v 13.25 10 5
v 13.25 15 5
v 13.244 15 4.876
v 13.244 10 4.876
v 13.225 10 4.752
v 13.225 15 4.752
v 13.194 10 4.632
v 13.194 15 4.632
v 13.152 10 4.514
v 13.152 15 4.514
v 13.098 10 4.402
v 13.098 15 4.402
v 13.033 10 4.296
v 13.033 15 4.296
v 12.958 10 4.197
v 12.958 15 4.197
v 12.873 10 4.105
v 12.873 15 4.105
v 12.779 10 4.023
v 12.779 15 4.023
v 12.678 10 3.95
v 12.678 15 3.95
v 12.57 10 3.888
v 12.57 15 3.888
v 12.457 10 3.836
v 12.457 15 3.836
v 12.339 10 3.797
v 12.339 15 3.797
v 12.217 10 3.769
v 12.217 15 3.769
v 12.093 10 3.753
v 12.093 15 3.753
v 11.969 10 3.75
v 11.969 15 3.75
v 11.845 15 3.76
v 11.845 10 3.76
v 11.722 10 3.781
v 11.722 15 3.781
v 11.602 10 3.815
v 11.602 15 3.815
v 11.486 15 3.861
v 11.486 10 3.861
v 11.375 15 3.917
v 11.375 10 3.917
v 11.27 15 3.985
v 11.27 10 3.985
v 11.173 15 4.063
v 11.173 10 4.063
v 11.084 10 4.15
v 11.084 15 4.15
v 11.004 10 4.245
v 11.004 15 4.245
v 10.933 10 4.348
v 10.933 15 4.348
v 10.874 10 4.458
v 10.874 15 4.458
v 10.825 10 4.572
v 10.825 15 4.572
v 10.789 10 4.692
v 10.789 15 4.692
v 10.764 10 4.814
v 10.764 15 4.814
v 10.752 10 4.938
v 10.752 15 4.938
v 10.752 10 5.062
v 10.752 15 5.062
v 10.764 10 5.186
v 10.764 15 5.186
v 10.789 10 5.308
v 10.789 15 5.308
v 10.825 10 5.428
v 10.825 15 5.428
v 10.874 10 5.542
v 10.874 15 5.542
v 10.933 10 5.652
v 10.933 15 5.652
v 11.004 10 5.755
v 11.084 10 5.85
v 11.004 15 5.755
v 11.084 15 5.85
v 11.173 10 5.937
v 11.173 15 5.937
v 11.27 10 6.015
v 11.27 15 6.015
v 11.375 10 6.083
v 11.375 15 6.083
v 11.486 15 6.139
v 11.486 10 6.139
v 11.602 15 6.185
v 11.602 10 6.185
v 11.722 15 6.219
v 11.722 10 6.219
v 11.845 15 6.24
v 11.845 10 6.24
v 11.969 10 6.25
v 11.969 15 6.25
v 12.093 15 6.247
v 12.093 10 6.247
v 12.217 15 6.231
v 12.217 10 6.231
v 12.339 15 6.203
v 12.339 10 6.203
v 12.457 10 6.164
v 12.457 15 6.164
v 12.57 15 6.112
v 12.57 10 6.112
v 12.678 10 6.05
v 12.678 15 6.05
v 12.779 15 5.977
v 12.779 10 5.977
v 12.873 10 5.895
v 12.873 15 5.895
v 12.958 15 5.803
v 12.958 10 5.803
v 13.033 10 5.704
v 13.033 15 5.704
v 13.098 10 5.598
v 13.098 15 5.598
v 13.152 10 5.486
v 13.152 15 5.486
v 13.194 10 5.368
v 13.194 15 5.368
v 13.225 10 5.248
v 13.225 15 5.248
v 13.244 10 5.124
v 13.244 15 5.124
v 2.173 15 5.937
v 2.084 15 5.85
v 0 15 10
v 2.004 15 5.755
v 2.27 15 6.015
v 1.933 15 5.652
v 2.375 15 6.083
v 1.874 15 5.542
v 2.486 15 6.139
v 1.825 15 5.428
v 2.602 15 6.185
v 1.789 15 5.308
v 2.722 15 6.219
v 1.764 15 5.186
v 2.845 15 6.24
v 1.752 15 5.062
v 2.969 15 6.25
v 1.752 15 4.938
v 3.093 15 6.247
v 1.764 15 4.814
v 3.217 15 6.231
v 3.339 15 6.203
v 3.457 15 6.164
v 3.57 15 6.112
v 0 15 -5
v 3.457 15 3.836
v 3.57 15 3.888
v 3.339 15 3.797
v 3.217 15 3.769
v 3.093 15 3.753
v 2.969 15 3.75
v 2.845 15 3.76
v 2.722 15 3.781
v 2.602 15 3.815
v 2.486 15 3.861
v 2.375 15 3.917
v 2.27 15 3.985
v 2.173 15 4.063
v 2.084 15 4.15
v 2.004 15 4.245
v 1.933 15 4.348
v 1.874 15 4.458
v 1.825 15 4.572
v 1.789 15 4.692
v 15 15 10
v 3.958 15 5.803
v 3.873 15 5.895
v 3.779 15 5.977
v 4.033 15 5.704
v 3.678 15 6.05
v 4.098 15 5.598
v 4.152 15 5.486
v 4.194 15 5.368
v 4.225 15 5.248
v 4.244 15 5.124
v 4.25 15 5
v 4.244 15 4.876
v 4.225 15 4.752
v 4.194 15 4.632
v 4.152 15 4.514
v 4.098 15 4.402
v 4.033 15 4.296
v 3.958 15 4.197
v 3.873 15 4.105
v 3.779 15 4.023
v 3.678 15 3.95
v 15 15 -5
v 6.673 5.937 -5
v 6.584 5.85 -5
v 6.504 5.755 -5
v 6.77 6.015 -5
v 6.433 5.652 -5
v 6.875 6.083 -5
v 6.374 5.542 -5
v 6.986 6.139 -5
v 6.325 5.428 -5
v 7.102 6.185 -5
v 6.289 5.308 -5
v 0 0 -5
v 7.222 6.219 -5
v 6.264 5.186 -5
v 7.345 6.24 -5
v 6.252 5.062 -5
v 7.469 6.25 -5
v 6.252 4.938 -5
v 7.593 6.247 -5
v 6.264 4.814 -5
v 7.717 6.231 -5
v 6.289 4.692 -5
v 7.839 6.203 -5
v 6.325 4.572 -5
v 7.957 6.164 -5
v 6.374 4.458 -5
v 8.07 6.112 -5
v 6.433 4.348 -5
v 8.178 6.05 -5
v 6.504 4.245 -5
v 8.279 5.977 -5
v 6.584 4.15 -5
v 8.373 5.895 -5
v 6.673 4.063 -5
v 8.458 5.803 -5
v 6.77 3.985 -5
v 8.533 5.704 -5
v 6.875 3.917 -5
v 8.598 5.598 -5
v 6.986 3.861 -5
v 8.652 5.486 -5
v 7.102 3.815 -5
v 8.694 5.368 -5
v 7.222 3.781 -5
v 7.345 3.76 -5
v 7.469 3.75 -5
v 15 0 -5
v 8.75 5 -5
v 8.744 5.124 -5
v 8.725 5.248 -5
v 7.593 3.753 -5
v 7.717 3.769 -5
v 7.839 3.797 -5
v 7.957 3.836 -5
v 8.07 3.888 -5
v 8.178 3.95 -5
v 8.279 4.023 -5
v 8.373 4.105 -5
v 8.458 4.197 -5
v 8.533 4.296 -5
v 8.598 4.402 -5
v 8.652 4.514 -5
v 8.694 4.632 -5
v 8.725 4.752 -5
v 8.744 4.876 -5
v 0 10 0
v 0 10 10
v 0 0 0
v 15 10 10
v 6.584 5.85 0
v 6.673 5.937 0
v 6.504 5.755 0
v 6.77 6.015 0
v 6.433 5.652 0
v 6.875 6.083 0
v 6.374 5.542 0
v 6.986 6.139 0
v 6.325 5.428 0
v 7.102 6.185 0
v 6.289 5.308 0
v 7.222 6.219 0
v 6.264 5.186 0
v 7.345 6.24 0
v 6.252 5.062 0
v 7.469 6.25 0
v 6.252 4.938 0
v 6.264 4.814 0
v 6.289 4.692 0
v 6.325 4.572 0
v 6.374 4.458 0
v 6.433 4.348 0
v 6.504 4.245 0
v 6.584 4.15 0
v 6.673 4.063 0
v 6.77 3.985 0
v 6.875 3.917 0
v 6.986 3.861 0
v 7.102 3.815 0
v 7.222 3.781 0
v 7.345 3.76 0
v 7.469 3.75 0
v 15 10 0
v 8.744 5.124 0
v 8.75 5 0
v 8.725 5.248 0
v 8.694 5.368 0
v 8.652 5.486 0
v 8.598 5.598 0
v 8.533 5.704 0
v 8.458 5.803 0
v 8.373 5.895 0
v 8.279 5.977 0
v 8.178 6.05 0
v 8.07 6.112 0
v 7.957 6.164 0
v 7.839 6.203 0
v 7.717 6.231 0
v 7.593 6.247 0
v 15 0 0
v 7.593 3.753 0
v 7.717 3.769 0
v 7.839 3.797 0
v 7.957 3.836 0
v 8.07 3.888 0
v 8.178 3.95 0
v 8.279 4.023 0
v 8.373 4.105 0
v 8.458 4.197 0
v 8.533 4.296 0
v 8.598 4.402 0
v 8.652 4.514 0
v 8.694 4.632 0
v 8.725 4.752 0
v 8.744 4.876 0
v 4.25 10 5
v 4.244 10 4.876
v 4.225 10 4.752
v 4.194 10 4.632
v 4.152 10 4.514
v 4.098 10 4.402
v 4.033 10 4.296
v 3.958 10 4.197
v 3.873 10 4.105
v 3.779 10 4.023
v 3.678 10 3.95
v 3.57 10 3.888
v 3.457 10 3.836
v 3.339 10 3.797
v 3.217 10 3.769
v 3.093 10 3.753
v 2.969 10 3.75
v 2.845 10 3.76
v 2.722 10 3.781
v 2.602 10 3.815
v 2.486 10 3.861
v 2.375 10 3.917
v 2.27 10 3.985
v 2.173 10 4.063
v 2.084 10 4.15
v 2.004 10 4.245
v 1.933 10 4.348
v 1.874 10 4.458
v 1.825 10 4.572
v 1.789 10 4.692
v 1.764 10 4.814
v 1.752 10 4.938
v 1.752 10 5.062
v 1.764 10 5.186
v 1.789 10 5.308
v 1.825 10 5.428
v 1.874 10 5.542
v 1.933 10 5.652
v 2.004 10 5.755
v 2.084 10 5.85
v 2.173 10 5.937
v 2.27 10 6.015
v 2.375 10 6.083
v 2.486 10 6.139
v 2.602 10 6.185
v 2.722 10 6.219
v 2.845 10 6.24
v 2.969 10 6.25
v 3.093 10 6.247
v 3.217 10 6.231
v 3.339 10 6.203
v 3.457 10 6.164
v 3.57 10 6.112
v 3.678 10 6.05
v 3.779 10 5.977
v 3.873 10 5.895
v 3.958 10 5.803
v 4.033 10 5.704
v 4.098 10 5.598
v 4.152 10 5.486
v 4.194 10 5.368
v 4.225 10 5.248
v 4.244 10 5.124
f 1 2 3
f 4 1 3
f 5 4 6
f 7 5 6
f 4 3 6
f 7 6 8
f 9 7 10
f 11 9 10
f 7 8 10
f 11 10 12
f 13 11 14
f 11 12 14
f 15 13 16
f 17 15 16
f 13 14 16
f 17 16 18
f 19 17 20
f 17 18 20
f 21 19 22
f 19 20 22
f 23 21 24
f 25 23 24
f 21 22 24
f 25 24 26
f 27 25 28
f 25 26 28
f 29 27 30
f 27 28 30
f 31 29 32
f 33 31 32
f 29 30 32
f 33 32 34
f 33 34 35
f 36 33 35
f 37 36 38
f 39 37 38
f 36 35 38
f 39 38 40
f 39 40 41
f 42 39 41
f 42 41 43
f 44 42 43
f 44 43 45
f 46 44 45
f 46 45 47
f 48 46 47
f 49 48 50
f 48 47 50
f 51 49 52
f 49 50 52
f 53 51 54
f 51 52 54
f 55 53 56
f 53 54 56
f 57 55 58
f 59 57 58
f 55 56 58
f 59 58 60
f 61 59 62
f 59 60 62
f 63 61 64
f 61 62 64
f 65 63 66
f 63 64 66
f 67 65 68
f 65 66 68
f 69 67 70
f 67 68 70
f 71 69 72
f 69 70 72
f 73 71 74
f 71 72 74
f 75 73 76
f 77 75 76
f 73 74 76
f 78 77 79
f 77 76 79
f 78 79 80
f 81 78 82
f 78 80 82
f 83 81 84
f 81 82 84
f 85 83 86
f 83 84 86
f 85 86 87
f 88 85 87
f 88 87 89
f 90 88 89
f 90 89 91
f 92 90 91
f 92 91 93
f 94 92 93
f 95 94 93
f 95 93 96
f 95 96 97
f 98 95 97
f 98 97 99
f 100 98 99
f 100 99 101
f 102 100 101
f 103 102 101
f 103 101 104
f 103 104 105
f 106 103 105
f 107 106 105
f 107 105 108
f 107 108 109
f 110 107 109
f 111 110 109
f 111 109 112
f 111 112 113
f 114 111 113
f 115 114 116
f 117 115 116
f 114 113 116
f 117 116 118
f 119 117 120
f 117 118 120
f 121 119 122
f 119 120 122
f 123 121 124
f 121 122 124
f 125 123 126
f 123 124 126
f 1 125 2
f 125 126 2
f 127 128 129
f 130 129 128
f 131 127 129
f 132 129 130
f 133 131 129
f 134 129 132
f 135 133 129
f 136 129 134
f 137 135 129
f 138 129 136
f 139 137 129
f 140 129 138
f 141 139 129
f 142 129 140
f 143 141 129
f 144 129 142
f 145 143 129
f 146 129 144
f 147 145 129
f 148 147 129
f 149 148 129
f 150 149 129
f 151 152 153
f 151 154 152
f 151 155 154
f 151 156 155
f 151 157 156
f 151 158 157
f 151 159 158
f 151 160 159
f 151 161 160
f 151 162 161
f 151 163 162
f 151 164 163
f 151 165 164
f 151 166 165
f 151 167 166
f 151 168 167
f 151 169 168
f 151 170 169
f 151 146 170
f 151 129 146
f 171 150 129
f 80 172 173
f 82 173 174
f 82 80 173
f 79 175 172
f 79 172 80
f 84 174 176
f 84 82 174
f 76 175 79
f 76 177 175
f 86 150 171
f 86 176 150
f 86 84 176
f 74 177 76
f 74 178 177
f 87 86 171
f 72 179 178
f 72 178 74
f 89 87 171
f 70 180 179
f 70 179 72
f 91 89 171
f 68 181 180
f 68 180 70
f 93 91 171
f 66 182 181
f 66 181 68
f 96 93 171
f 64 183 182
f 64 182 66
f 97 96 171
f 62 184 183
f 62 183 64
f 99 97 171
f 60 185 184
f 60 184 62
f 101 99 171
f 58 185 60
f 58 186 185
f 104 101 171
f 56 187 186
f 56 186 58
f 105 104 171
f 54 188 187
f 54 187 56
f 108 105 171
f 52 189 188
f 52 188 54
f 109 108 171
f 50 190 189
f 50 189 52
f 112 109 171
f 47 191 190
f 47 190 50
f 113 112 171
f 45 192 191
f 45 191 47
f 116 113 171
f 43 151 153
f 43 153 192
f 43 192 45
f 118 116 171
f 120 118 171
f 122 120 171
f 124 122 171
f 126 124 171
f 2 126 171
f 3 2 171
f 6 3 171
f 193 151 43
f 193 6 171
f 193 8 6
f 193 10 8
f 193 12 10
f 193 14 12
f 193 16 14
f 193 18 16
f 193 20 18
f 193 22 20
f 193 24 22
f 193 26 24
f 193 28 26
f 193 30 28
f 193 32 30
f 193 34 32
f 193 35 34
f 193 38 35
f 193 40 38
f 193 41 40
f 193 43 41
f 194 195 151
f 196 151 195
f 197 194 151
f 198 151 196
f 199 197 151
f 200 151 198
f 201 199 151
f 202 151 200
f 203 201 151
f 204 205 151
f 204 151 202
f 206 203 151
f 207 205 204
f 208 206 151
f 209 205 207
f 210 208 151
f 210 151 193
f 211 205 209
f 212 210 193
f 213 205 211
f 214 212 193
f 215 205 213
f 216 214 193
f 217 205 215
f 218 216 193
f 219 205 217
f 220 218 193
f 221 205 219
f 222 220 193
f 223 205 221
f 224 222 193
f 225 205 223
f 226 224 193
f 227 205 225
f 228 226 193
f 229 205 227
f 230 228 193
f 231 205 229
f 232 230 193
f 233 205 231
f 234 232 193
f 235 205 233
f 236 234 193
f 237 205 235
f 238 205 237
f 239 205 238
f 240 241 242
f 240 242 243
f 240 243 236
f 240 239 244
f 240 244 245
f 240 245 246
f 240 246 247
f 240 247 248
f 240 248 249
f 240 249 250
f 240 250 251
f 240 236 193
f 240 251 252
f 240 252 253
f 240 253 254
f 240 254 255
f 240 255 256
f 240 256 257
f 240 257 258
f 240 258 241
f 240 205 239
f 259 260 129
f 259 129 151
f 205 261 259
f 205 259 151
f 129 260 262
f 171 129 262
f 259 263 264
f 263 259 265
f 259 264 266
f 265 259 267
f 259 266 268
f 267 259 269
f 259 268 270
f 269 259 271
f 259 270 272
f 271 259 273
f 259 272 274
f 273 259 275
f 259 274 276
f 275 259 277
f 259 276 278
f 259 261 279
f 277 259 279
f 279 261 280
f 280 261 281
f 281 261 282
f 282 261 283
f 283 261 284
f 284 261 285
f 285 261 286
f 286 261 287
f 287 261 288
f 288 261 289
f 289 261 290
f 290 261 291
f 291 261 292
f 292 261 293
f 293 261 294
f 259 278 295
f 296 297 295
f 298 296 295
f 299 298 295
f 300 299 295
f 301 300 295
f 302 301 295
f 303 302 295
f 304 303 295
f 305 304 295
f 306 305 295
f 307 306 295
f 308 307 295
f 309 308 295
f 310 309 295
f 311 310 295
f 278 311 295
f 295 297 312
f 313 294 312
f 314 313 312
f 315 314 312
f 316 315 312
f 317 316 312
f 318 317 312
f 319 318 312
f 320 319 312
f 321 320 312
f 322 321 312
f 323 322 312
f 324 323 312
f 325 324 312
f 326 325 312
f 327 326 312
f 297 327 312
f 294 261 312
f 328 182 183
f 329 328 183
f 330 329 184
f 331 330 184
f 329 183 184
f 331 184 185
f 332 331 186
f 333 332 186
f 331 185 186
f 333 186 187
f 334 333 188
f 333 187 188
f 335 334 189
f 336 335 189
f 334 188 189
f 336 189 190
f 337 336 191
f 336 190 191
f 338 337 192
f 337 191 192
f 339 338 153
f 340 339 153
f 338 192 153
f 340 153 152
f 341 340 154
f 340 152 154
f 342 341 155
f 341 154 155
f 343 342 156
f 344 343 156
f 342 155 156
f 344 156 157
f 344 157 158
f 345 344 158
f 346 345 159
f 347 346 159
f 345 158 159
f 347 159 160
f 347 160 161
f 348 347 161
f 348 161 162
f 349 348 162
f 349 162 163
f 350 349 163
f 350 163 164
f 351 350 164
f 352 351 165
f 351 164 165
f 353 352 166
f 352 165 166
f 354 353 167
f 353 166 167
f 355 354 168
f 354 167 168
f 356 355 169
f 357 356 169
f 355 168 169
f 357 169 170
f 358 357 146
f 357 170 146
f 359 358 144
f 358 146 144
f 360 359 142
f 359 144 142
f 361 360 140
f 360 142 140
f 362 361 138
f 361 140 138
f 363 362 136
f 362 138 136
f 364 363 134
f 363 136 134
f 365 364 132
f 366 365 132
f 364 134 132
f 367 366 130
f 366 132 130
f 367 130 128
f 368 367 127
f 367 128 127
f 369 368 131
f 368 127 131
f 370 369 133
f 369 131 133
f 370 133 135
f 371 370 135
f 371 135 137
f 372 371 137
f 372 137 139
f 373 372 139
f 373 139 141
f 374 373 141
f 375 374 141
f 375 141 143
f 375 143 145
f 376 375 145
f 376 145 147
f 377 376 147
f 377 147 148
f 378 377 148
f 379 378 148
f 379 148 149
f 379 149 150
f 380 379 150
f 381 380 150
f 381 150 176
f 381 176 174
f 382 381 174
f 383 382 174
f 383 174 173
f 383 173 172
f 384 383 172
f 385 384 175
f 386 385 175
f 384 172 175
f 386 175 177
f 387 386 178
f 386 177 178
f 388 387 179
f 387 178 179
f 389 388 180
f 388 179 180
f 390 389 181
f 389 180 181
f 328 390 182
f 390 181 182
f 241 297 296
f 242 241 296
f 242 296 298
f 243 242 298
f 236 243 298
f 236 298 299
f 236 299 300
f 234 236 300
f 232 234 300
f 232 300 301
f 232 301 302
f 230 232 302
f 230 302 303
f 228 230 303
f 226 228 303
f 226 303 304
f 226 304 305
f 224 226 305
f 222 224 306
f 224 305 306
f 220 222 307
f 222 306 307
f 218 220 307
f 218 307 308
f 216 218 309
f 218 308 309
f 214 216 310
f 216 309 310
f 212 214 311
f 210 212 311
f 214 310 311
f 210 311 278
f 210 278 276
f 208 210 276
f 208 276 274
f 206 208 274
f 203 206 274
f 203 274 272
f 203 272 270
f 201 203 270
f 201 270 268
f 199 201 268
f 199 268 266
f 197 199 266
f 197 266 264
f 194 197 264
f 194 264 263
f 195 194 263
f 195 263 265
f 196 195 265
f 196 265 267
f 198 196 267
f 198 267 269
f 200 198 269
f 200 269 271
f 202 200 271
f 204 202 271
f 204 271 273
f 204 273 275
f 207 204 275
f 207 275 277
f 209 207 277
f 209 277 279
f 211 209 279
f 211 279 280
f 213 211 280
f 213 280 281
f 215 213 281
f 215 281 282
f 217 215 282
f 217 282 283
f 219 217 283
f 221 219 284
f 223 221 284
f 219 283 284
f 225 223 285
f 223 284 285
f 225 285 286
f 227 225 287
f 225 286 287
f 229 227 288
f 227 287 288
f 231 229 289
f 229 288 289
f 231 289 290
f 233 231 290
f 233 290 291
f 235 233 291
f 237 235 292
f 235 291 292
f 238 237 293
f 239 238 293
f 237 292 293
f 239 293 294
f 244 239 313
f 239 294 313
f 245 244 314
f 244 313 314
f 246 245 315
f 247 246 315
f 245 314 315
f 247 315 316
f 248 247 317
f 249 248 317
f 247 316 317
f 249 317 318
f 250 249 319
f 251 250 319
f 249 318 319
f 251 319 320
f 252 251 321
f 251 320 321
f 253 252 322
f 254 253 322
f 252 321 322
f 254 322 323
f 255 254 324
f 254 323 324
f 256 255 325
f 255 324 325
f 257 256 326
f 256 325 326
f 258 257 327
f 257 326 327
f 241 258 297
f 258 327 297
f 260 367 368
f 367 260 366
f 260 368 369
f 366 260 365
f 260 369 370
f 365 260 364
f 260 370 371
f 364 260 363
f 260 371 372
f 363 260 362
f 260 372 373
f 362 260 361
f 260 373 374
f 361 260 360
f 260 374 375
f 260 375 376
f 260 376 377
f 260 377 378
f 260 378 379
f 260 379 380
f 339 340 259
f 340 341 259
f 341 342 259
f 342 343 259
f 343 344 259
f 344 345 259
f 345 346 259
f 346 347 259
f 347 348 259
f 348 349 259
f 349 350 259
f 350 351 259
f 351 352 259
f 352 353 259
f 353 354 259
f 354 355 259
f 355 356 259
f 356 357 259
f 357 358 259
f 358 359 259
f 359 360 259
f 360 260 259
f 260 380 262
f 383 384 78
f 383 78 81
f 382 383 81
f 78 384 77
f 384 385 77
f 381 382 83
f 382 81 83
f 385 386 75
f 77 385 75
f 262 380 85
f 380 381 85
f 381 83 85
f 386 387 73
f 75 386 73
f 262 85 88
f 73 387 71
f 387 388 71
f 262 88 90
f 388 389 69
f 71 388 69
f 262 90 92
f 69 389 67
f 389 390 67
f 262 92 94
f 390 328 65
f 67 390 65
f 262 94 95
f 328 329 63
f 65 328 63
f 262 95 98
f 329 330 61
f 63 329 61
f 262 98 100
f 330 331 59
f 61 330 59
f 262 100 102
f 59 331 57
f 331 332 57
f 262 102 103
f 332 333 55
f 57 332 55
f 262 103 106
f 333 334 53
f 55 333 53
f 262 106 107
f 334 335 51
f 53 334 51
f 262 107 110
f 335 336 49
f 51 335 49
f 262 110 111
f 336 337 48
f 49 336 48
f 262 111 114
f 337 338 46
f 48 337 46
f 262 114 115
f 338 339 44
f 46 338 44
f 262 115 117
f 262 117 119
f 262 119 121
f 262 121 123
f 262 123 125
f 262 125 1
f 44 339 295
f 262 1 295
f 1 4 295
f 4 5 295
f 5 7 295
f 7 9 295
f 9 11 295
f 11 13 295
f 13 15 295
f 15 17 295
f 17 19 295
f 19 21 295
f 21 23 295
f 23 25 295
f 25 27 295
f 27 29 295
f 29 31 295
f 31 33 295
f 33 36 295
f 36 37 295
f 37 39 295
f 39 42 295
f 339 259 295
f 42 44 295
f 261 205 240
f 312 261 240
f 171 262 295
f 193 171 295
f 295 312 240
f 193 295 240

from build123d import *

# Parameters (mm, degrees)
SKETCH_1_W          = 15
SKETCH_1_H          = 5
EXTRUDE_1_DEPTH     = 10
SKETCH_2_W          = 15
SKETCH_2_H          = 15
EXTRUDE_2_DEPTH     = 5
SKETCH_3_R          = 1.25
CUT_EXTRUDE_1_DEPTH = 6
SKETCH_4_R          = 1.25
CUT_EXTRUDE_2_DEPTH = 5


with BuildPart() as part:
    # 草图1 → 凸台-拉伸1 (new body)
    with BuildSketch(Plane(origin=(0, 0, 0), x_dir=(1, 0, 0), z_dir=(0, 1, 0))):
        with Locations((7.5, 2.5)):
            Rectangle(SKETCH_1_W, SKETCH_1_H)
    extrude(amount=EXTRUDE_1_DEPTH)

    # 草图2 → 凸台-拉伸2 (add)
    with BuildSketch(Plane(origin=(0, 10, 0), x_dir=(1, 0, 0), z_dir=(0, 1, 0))):
        with Locations((7.5, -2.5)):
            Rectangle(SKETCH_2_W, SKETCH_2_H)
    extrude(amount=EXTRUDE_2_DEPTH)

    # 草图3 → 切除-拉伸1 (cut, through all)
    with BuildSketch(Plane.XY):
        with Locations((7.5, 5)):
            Circle(SKETCH_3_R)
    extrude(amount=-CUT_EXTRUDE_1_DEPTH, mode=Mode.SUBTRACT)

    # 草图4 → 切除-拉伸2 (cut)
    with BuildSketch(Plane(origin=(0, 15, 0), x_dir=(1, 0, 0), z_dir=(0, 1, 0))):
        with Locations((3, -5)):
            Circle(SKETCH_4_R)
        with Locations((12, -5)):
            Circle(SKETCH_4_R)
    extrude(amount=-CUT_EXTRUDE_2_DEPTH, mode=Mode.SUBTRACT)


solid = part.part
